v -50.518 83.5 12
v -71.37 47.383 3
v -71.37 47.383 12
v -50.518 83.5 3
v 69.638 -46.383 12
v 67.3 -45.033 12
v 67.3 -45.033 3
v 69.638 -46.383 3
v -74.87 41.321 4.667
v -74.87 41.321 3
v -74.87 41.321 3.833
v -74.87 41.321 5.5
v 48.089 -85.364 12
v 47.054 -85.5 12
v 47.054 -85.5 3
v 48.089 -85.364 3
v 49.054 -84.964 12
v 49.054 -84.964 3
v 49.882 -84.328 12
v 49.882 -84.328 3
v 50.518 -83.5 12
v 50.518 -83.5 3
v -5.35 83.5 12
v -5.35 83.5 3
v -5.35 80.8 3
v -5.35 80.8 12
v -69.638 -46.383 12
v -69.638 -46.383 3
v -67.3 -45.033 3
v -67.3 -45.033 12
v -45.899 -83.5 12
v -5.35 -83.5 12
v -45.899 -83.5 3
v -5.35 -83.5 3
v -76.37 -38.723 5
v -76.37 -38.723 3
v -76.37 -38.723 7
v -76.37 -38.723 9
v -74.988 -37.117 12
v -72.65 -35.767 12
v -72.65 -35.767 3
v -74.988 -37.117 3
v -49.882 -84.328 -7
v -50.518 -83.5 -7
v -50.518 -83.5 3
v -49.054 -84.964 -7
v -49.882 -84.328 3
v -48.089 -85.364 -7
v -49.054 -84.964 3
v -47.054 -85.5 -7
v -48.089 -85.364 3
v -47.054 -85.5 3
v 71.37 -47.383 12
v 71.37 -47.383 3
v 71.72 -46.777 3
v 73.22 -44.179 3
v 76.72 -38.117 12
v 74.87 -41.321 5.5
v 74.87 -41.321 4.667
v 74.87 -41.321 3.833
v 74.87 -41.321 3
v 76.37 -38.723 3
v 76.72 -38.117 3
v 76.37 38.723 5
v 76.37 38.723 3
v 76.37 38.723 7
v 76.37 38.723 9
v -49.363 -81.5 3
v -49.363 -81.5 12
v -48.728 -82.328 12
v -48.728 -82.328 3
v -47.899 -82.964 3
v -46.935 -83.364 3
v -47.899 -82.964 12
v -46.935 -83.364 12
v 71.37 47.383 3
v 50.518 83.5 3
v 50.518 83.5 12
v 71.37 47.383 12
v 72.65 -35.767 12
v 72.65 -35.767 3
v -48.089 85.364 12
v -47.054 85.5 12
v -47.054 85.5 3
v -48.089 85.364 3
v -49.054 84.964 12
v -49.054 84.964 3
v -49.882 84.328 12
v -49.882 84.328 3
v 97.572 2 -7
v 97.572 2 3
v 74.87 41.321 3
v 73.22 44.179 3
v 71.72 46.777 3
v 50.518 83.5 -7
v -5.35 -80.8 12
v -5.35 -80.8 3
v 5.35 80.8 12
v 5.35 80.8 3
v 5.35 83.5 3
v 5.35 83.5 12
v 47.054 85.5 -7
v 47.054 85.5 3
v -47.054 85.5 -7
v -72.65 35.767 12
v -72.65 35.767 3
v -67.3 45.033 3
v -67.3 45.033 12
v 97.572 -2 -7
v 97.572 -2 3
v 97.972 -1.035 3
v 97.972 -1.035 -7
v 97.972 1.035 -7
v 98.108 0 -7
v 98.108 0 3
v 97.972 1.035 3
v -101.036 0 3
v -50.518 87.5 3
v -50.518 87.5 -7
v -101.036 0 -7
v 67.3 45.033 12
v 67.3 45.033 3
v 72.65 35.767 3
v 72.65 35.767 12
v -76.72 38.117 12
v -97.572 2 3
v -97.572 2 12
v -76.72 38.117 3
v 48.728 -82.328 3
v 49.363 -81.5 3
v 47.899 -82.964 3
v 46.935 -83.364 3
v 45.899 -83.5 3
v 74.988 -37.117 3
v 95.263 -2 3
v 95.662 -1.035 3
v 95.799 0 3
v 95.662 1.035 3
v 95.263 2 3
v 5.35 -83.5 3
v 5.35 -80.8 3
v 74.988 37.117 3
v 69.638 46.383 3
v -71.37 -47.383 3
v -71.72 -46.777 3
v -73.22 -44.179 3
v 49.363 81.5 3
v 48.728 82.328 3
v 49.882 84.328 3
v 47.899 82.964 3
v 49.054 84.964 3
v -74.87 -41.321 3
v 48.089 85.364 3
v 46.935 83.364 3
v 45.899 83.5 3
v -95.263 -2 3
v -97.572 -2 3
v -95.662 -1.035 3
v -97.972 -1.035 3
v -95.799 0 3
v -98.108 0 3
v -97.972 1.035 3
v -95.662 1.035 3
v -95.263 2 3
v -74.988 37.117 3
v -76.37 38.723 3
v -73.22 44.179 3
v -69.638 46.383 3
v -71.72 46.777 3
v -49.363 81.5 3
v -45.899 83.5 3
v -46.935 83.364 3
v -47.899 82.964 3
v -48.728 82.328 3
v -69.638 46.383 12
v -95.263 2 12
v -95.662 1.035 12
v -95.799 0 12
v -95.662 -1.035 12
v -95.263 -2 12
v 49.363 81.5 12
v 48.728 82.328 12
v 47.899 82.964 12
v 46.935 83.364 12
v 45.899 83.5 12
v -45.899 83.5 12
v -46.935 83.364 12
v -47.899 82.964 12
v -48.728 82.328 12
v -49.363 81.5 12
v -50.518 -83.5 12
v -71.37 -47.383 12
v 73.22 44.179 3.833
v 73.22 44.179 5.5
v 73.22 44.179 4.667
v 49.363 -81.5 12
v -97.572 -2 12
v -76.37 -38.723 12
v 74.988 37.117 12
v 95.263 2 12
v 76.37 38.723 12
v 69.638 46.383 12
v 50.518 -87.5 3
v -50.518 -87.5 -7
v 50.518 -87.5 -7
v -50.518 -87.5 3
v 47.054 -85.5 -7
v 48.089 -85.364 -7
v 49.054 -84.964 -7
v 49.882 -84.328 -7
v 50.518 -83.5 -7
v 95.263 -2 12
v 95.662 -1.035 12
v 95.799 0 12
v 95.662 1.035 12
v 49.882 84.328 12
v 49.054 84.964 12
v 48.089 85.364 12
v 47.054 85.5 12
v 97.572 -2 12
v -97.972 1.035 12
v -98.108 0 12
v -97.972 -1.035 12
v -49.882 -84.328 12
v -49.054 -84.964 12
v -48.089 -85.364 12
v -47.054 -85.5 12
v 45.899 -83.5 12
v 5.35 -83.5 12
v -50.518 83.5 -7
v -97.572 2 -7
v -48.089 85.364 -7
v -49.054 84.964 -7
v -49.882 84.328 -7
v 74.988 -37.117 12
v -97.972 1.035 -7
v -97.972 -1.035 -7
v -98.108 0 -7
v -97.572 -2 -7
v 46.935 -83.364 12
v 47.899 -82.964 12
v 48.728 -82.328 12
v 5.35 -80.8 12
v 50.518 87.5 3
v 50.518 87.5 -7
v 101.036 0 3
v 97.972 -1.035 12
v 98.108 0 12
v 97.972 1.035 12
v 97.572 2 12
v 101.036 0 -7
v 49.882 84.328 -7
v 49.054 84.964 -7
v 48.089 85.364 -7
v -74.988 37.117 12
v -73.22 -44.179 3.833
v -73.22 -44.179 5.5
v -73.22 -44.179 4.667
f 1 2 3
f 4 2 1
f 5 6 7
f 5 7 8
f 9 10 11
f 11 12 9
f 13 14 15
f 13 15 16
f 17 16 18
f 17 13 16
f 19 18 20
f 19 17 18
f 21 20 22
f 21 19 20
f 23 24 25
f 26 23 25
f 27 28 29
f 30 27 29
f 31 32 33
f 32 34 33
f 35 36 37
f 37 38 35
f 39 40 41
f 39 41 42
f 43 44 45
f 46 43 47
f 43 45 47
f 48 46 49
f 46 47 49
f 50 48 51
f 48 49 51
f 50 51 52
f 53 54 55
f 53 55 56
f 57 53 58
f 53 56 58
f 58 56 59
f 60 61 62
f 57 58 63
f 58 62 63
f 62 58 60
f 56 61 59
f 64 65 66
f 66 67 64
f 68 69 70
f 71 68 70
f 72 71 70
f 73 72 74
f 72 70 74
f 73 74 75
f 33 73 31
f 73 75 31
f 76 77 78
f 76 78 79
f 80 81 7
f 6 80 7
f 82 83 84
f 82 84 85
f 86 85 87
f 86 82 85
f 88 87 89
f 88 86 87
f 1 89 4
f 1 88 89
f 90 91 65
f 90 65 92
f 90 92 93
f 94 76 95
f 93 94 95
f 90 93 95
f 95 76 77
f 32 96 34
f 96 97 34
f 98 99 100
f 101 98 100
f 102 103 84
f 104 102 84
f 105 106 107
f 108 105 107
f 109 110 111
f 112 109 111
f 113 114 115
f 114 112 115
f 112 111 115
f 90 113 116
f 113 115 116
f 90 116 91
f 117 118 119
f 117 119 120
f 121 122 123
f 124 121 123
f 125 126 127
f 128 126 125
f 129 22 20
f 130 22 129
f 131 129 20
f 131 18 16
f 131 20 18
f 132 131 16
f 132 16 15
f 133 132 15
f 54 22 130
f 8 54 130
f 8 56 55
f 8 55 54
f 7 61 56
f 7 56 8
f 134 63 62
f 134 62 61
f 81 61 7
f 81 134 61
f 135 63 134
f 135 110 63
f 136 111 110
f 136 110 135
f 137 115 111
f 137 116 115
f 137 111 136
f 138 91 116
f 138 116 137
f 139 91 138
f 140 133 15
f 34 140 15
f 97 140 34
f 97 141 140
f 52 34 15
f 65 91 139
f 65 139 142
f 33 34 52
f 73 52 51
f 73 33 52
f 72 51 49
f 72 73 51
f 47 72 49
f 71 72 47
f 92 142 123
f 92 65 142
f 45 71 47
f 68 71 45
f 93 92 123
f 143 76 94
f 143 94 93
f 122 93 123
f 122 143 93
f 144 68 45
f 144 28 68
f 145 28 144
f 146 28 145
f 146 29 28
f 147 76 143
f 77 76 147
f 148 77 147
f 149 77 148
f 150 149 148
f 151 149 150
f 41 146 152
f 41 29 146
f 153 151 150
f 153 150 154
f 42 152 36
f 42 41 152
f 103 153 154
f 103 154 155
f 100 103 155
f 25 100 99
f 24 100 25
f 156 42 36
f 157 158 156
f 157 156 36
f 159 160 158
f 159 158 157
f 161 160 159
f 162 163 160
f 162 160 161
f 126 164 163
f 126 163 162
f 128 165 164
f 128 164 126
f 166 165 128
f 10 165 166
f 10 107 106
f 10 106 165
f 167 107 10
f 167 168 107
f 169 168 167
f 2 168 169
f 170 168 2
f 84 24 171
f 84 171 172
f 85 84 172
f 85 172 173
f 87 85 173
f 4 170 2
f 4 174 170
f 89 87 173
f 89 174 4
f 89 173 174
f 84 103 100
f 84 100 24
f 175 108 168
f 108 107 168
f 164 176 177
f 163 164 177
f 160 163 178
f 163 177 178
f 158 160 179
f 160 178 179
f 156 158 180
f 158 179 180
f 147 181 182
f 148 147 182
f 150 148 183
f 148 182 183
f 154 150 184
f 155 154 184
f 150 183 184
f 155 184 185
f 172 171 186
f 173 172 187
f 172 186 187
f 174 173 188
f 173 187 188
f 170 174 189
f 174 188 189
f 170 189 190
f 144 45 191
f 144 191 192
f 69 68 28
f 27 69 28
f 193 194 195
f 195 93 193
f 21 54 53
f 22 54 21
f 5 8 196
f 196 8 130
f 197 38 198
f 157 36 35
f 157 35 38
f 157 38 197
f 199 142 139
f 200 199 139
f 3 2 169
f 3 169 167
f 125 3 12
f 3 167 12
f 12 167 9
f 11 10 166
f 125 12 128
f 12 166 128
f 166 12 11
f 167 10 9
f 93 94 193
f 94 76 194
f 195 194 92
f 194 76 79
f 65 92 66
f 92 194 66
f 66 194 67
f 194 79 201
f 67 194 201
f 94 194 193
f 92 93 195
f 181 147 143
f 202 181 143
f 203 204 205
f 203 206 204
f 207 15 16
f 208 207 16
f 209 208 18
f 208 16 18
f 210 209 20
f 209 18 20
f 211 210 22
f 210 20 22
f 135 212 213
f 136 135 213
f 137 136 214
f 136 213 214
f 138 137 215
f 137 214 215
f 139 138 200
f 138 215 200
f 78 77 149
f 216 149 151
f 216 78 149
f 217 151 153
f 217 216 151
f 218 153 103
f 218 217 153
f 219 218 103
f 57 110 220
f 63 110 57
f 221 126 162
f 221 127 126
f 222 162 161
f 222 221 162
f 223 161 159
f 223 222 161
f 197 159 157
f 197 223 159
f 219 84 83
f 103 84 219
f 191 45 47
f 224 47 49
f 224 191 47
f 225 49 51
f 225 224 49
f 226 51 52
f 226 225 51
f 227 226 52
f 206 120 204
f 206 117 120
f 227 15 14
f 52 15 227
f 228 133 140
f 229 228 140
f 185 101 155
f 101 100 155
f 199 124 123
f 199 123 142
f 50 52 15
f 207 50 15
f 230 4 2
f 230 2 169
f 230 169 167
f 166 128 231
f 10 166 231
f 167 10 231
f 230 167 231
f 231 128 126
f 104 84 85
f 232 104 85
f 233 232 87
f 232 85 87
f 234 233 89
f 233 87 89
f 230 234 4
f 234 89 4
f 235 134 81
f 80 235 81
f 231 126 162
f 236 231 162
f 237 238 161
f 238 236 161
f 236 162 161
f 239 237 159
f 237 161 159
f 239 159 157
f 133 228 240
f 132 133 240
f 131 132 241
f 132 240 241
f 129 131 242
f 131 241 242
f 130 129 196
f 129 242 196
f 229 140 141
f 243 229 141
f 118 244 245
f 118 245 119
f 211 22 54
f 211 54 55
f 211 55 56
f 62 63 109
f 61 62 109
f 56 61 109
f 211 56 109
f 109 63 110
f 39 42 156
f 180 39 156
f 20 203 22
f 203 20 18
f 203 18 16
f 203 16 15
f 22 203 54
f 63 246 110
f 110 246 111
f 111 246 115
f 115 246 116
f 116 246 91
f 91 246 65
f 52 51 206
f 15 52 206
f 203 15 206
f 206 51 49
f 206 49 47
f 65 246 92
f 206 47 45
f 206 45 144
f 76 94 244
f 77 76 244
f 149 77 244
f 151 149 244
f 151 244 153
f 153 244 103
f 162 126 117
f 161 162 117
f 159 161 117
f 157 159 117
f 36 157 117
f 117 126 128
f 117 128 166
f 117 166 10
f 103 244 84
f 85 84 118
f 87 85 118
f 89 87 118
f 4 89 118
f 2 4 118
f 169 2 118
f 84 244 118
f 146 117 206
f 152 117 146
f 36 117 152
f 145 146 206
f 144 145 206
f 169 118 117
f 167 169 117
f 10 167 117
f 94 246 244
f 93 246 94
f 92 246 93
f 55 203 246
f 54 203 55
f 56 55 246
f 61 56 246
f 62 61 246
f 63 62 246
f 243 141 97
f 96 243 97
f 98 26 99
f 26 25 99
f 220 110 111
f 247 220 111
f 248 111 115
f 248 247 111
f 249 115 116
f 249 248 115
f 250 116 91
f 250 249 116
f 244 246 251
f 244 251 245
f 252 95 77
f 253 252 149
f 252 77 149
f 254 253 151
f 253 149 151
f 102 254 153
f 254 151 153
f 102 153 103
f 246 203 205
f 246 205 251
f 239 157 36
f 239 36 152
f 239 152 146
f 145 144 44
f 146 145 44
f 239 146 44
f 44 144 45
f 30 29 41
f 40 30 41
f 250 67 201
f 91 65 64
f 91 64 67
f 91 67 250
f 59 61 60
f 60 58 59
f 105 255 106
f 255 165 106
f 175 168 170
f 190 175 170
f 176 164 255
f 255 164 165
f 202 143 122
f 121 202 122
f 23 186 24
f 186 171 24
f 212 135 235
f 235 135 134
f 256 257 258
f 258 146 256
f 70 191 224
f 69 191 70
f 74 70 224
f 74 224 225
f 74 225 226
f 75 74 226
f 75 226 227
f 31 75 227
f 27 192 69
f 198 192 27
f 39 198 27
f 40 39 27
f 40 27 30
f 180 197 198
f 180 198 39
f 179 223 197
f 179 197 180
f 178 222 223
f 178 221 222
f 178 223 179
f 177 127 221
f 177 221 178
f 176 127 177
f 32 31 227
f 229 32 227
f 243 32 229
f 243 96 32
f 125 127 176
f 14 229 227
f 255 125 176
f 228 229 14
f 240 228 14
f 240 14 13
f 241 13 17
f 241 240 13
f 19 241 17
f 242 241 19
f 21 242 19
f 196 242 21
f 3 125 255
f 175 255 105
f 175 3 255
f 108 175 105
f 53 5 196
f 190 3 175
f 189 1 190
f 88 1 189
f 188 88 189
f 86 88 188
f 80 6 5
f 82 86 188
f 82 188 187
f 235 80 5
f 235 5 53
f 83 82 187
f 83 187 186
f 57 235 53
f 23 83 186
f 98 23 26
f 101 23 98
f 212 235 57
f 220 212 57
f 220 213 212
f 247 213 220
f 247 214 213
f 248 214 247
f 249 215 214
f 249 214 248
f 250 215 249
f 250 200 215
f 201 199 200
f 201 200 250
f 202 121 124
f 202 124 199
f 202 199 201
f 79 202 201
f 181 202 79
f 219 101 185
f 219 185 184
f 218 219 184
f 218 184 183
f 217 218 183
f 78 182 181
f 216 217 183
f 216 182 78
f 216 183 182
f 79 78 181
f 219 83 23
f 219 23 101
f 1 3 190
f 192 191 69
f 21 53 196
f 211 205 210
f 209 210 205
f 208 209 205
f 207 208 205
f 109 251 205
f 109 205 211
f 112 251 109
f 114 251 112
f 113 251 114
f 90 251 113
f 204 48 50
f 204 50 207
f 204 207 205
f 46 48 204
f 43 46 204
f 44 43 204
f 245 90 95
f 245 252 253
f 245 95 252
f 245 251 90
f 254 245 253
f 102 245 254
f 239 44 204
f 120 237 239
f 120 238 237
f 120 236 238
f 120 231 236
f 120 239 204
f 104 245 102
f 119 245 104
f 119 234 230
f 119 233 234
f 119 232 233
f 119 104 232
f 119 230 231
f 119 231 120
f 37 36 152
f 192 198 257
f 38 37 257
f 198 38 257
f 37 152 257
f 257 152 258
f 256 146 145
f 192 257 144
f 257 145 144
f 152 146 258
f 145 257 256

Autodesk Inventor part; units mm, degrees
ref_plane "YZ Plane" through (0, 0, 0) normal (1, 0, 0) x (0, 1, 0)
ref_plane "XZ Plane" through (0, 0, 0) normal (0, 1, 0) x (-1, 0, 0)
ref_plane "XY Plane" through (0, 0, 0) normal (0, 0, 1) x (1, 0, 0)
sketch "Sketch1" plane through (0, 0, 0) normal (0, 0, 1) x (1, 0, 0)
  line L0 (50.5181, -87.5) -> (-50.5181, -87.5)
  line L1 (-50.5181, -87.5) -> (-101.0363, 0)
  line L2 (-101.0363, 0) -> (-50.5181, 87.5)
  line L3 (-50.5181, 87.5) -> (50.5181, 87.5)
  line L4 (50.5181, 87.5) -> (101.0363, 0)
  line L5 (101.0363, 0) -> (50.5181, -87.5)
  point P0 (0, 0)
  point P1 (0, 0)
  dimension "d0" = 175
extrude "Extrusion1" add sketch "Sketch1" along normal blind 2
sketch "Sketch5" plane through (0, 0, 2) normal (0, 0, 1) x (1, 0, 0)
  line L0 (-50.5181, -87.5) -> (50.5181, -87.5) projected
  line L1 (50.5181, -87.5) -> (101.0363, 0) projected
  line L2 (101.0363, 0) -> (50.5181, 87.5) projected
  line L3 (50.5181, 87.5) -> (-50.5181, 87.5) projected
  line L4 (-50.5181, 87.5) -> (-101.0363, 0) projected
  line L5 (-101.0363, 0) -> (-50.5181, -87.5) projected
  line L6 (-98.7269, 0) -> (-49.3634, 85.5)
  line L7 (-49.3634, 85.5) -> (49.3634, 85.5)
  line L8 (49.3634, 85.5) -> (98.7269, 0)
  line L9 (98.7269, 0) -> (49.3634, -85.5)
  line L10 (49.3634, -85.5) -> (-49.3634, -85.5)
  line L11 (-49.3634, -85.5) -> (-98.7269, 0)
  line L12 (-96.4175, 0) -> (-48.2087, 83.5)
  line L13 (-48.2087, 83.5) -> (48.2087, 83.5)
  line L14 (48.2087, 83.5) -> (96.4175, 0)
  line L15 (96.4175, 0) -> (48.2087, -83.5)
  line L16 (48.2087, -83.5) -> (-48.2087, -83.5)
  line L17 (-48.2087, -83.5) -> (-96.4175, 0)
  point P0 (0, 0)
  dimension "d15" = 2
  dimension "d16" = 2
extrude "Extrusion5" add sketch "Sketch5" along normal blind 10 contours L6 L7 L8 L9 L10 L11
sketch "Sketch7" plane through (0, 0, 2) normal (0, 0, 1) x (1, 0, 0)
  line L0 (48.2087, 83.5) -> (-48.2087, 83.5) projected
  line L1 (-48.2087, 83.5) -> (-96.4175, 0) projected
  line L2 (-96.4175, 0) -> (-48.2087, -83.5) projected
  line L3 (-48.2087, -83.5) -> (48.2087, -83.5) projected
  line L4 (48.2087, -83.5) -> (96.4175, 0) projected
  line L5 (96.4175, 0) -> (48.2087, 83.5) projected
  line L6 (-45.8993, -79.5) -> (-91.7987, 0)
  line L7 (-91.7987, 0) -> (-45.8993, 79.5)
  line L8 (-45.8993, 79.5) -> (45.8993, 79.5)
  line L9 (45.8993, 79.5) -> (91.7987, 0)
  line L10 (91.7987, 0) -> (45.8993, -79.5)
  line L11 (45.8993, -79.5) -> (-45.8993, -79.5)
  point P0 (0, 0)
  dimension "d19" = 4
extrude "Extrusion6" cut sketch "Sketch7" against normal blind 7 contours L6 L7 L8 L9 L10 L11
fillet "Fillet1" radius 10 6 edges at (50.5181, 87.5, 1) (101.0363, 0, 1) (50.5181, -87.5, 1) (-50.5181, -87.5, 1) (-101.0363, 0, 1) (-50.5181, 87.5, 1)
fillet "Fillet1" radius 4 12 edges at (49.3634, -85.5, 7) (-48.2087, -83.5, 7) (-98.7269, 0, 7) (-49.3634, 85.5, 7) (49.3634, 85.5, 7) (98.7269, 0, 7) (48.2087, -83.5, 7) (96.4175, 0, 7) (-48.2087, 83.5, 7) (48.2087, 83.5, 7) (-49.3634, -85.5, 7) (-96.4175, 0, 7)
fillet "Fillet2" radius 10 6 edges at (45.8993, -79.5, 1) (91.7987, 0, 1) (45.8993, 79.5, 1) (-45.8993, 79.5, 1) (-91.7987, 0, 1) (-45.8993, -79.5, 1)
sketch "Sketch8" plane through (0, 0, 12) normal (0, 0, 1) x (1, 0, 0)
  line L0 (-1.65, 83.5) -> (1.65, 83.5)
  line L1 (1.65, 83.5) -> (1.65, 85.5)
  line L2 (1.65, 85.5) -> (-1.65, 85.5)
  line L3 (-1.65, 85.5) -> (-1.65, 83.5)
  line L4 (47.054, 85.5) -> (-47.054, 85.5) projected
  line L5 (-45.8993, 83.5) -> (45.8993, 83.5) projected
  point P0 (0, 0)
  point P1 (0, 85.5)
  point P2 (0, 85.5)
  point P3 (0, 0)
  dimension "d25" = 3.3
extrude "Extrusion7" cut sketch "Sketch8" against normal blind 6.5
sketch "Sketch9" plane through (0, 0, 12) normal (0, 0, 1) x (1, 0, 0)
  line L0 (-4.65, 81.5) -> (-1.65, 81.5)
  line L1 (-1.65, 81.5) -> (-1.65, 85.5)
  line L2 (-1.65, 85.5) -> (-4.65, 85.5)
  line L3 (-4.65, 85.5) -> (-4.65, 81.5)
  line L4 (1.65, 83.5) -> (-1.65, 83.5) projected
  line L5 (1.65, 85.5) -> (1.65, 83.5) projected
  line L6 (-1.65, 85.5) -> (1.65, 85.5) projected
  line L7 (-1.65, 83.5) -> (-1.65, 85.5) projected
  line L8 (0, 83.5) -> (0, 81.6202) construction
  line L9 (-45.8993, 83.5) -> (-1.65, 83.5) projected
  line L10 (-1.65, 83.5) -> (-1.65, 85.5) projected
  line L11 (4.65, 81.5) -> (1.65, 81.5)
  line L12 (1.65, 81.5) -> (1.65, 85.5)
  line L13 (1.65, 85.5) -> (4.65, 85.5)
  line L14 (4.65, 85.5) -> (4.65, 81.5)
  line L15 (-1.65, 85.5) -> (-47.054, 85.5) projected
  point P0 (0, 0)
  dimension "d28" = 4
  dimension "d29" = 3
extrude "Extrusion8" add sketch "Sketch9" against normal up to surface (10 mm away) contours L3 L9 L1 L0 | L3 L2 L1 L9 | L5 L13 L14 L11 L12
pattern_circular "Circular Pattern1" count 6 over 360 about axis through (0, 0, 0) along (0, 0, 1) of "Extrusion8", "Extrusion7"
sketch "Sketch11" plane through (0, 0, 0) normal (0, 0, -1) x (-1, 0, 0)
  arc A0 (53.4049, 82.5) -> (44.7446, 87.5) centre (44.7446, 77.5) ccw projected
  line L0 (44.7446, 87.5) -> (-44.7446, 87.5) projected
  arc A1 (-44.7446, 87.5) -> (-53.4049, 82.5) centre (-44.7446, 77.5) ccw projected
  line L1 (-53.4049, 82.5) -> (-98.1495, 5) projected
  arc A2 (-98.1495, 5) -> (-98.1495, -5) centre (-89.4893, 0) ccw projected
  line L2 (-98.1495, -5) -> (-53.4049, -82.5) projected
  arc A3 (-53.4049, -82.5) -> (-44.7446, -87.5) centre (-44.7446, -77.5) ccw projected
  line L3 (-44.7446, -87.5) -> (44.7446, -87.5) projected
  arc A4 (44.7446, -87.5) -> (53.4049, -82.5) centre (44.7446, -77.5) ccw projected
  line L4 (53.4049, -82.5) -> (98.1495, -5) projected
  arc A5 (98.1495, -5) -> (98.1495, 5) centre (89.4893, 0) ccw projected
  line L5 (98.1495, 5) -> (53.4049, 82.5) projected
  line L6 (40.1258, -79.5) -> (-40.1258, -79.5) projected
  arc A6 (-48.7861, -74.5) -> (-40.1258, -79.5) centre (-40.1258, -69.5) ccw projected
  line L7 (-48.7861, -74.5) -> (-88.9119, -5) projected
  arc A7 (-88.9119, 5) -> (-88.9119, -5) centre (-80.2517, 0) ccw projected
  line L8 (-88.9119, 5) -> (-48.7861, 74.5) projected
  arc A8 (-40.1258, 79.5) -> (-48.7861, 74.5) centre (-40.1258, 69.5) ccw projected
  line L9 (-40.1258, 79.5) -> (40.1258, 79.5) projected
  arc A9 (48.7861, 74.5) -> (40.1258, 79.5) centre (40.1258, 69.5) ccw projected
  line L10 (48.7861, 74.5) -> (88.9119, 5) projected
  arc A10 (88.9119, -5) -> (88.9119, 5) centre (80.2517, 0) ccw projected
  line L11 (88.9119, -5) -> (48.7861, -74.5) projected
  arc A11 (40.1258, -79.5) -> (48.7861, -74.5) centre (40.1258, -69.5) ccw projected
  point P0 (0, 0)
extrude "Extrusion9" cut sketch "Sketch11" against normal blind 3
sketch "Sketch12" plane through (0, 0, 12) normal (0, 0, 1) x (1, 0, 0)
  line L0 (74.6381, 37.723) -> (95.2628, 2) projected
  arc A0 (95.2628, -2) -> (95.2628, 2) centre (91.7987, 0) ccw projected
  line L1 (95.2628, -2) -> (74.6381, -37.723) projected
  line L2 (74.6381, -37.723) -> (72.9061, -36.723) projected
  line L3 (72.9061, -36.723) -> (71.4061, -39.3211) projected
  line L4 (71.4061, -39.3211) -> (74.8702, -41.3211) projected
  line L5 (74.8702, -41.3211) -> (97.5722, -2) projected
  arc A1 (97.5722, -2) -> (97.5722, 2) centre (94.1081, 0) ccw projected
  line L6 (97.5722, 2) -> (74.8702, 41.3211) projected
  line L7 (71.4061, 39.3211) -> (74.8702, 41.3211) projected
  line L8 (72.9061, 36.723) -> (71.4061, 39.3211) projected
  line L9 (74.6381, 37.723) -> (72.9061, 36.723) projected
  line L10 (73.2202, 44.1789) -> (50.5181, 83.5) projected
  arc A2 (50.5181, 83.5) -> (47.054, 85.5) centre (47.054, 81.5) ccw projected
  line L11 (47.054, 85.5) -> (1.65, 85.5) projected
  line L12 (1.65, 81.5) -> (1.65, 85.5) projected
  line L13 (4.65, 81.5) -> (1.65, 81.5) projected
  line L14 (4.65, 83.5) -> (4.65, 81.5) projected
  line L15 (4.65, 83.5) -> (45.8993, 83.5) projected
  arc A3 (49.3634, 81.5) -> (45.8993, 83.5) centre (45.8993, 79.5) ccw projected
  line L16 (49.3634, 81.5) -> (69.9881, 45.777) projected
  line L17 (69.9881, 45.777) -> (68.2561, 44.777) projected
  line L18 (68.2561, 44.777) -> (69.7561, 42.1789) projected
  line L19 (69.7561, 42.1789) -> (73.2202, 44.1789) projected
  line L20 (-69.9881, 45.777) -> (-49.3634, 81.5) projected
  arc A4 (-45.8993, 83.5) -> (-49.3634, 81.5) centre (-45.8993, 79.5) ccw projected
  line L21 (-45.8993, 83.5) -> (-4.65, 83.5) projected
  line L22 (-4.65, 83.5) -> (-4.65, 81.5) projected
  line L23 (-4.65, 81.5) -> (-1.65, 81.5) projected
  line L24 (-1.65, 81.5) -> (-1.65, 85.5) projected
  line L25 (-1.65, 85.5) -> (-47.054, 85.5) projected
  arc A5 (-47.054, 85.5) -> (-50.5181, 83.5) centre (-47.054, 81.5) ccw projected
  line L26 (-50.5181, 83.5) -> (-73.2202, 44.1789) projected
  line L27 (-69.7561, 42.1789) -> (-73.2202, 44.1789) projected
  line L28 (-68.2561, 44.777) -> (-69.7561, 42.1789) projected
  line L29 (-69.9881, 45.777) -> (-68.2561, 44.777) projected
  line L30 (-74.6381, -37.723) -> (-95.2628, -2) projected
  arc A6 (-95.2628, 2) -> (-95.2628, -2) centre (-91.7987, 0) ccw projected
  line L31 (-95.2628, 2) -> (-74.6381, 37.723) projected
  line L32 (-74.6381, 37.723) -> (-72.9061, 36.723) projected
  line L33 (-72.9061, 36.723) -> (-71.4061, 39.3211) projected
  line L34 (-71.4061, 39.3211) -> (-74.8702, 41.3211) projected
  line L35 (-74.8702, 41.3211) -> (-97.5722, 2) projected
  arc A7 (-97.5722, 2) -> (-97.5722, -2) centre (-94.1081, 0) ccw projected
  line L36 (-97.5722, -2) -> (-74.8702, -41.3211) projected
  line L37 (-71.4061, -39.3211) -> (-74.8702, -41.3211) projected
  line L38 (-72.9061, -36.723) -> (-71.4061, -39.3211) projected
  line L39 (-74.6381, -37.723) -> (-72.9061, -36.723) projected
  line L40 (-4.65, -83.5) -> (-45.8993, -83.5) projected
  arc A8 (-49.3634, -81.5) -> (-45.8993, -83.5) centre (-45.8993, -79.5) ccw projected
  line L41 (-49.3634, -81.5) -> (-69.9881, -45.777) projected
  line L42 (-69.9881, -45.777) -> (-68.2561, -44.777) projected
  line L43 (-68.2561, -44.777) -> (-69.7561, -42.1789) projected
  line L44 (-69.7561, -42.1789) -> (-73.2202, -44.1789) projected
  line L45 (-73.2202, -44.1789) -> (-50.5181, -83.5) projected
  arc A9 (-50.5181, -83.5) -> (-47.054, -85.5) centre (-47.054, -81.5) ccw projected
  line L46 (-47.054, -85.5) -> (-1.65, -85.5) projected
  line L47 (-1.65, -81.5) -> (-1.65, -85.5) projected
  line L48 (-4.65, -81.5) -> (-1.65, -81.5) projected
  line L49 (-4.65, -83.5) -> (-4.65, -81.5) projected
  line L50 (69.9881, -45.777) -> (49.3634, -81.5) projected
  arc A10 (45.8993, -83.5) -> (49.3634, -81.5) centre (45.8993, -79.5) ccw projected
  line L51 (45.8993, -83.5) -> (4.65, -83.5) projected
  line L52 (4.65, -83.5) -> (4.65, -81.5) projected
  line L53 (4.65, -81.5) -> (1.65, -81.5) projected
  line L54 (1.65, -81.5) -> (1.65, -85.5) projected
  line L55 (1.65, -85.5) -> (47.054, -85.5) projected
  arc A11 (47.054, -85.5) -> (50.5181, -83.5) centre (47.054, -81.5) ccw projected
  line L56 (50.5181, -83.5) -> (73.2202, -44.1789) projected
  line L57 (69.7561, -42.1789) -> (73.2202, -44.1789) projected
  line L58 (68.2561, -44.777) -> (69.7561, -42.1789) projected
  line L59 (69.9881, -45.777) -> (68.2561, -44.777) projected
  line L60 (74.6381, 37.723) -> (72.9061, 36.723) projected
  line L61 (72.9061, 36.723) -> (76.3702, 38.723)
  line L62 (97.5722, 2) -> (74.8702, 41.3211) projected
  line L63 (76.3702, 38.723) -> (74.8702, 41.3211)
  line L64 (74.8702, 41.3211) -> (71.4061, 39.3211)
  line L65 (71.4061, 39.3211) -> (72.9061, 36.723)
  line L66 (69.7561, 42.1789) -> (73.2202, 44.1789) projected
  line L67 (73.2202, 44.1789) -> (69.7561, 42.1789)
  line L68 (69.7561, 42.1789) -> (68.2561, 44.777)
  line L69 (68.2561, 44.777) -> (71.7202, 46.777)
  line L70 (71.7202, 46.777) -> (73.2202, 44.1789)
  line L71 (97.5722, 2) -> (50.5181, 83.5) projected
  point P0 (0, 0)
extrude "Extrusion10" cut sketch "Sketch12" against normal blind 3 contours L19 L18 L17 L69 L10 | L9 L8 L7 L6 L61
sketch "Sketch13" plane through (73.1381, 40.3211, 5.5) normal (0, 0, 1) x (0.866, 0.5, 0)
  line L0 (0, 0) -> (0, 3.3) projected
  line L1 (2, 0) -> (0, 0) projected
  line L2 (2, 3.3) -> (2, 0) projected
  line L3 (0, 3.3) -> (2, 3.3) projected
  line L4 (2, 6.3) -> (2, 3.3) projected
  line L5 (0, 6.3) -> (2, 6.3) projected
  line L6 (-2, 6.3) -> (0, 6.3) projected
  line L7 (-2, 3.3) -> (-2, 6.3) projected
  line L8 (2, 3.3) -> (-2, 3.3) projected
  line L9 (2, -3) -> (0, -3) projected
  line L10 (2, 0) -> (2, -3) projected
  line L11 (-2, 0) -> (2, 0) projected
  line L12 (-2, -3) -> (-2, 0) projected
  line L13 (0, -3) -> (-2, -3) projected
  line L14 (0, 0) -> (-2, 0) projected
  line L15 (2, 3.3) -> (-2, 3.3)
  line L16 (-2, 3.3) -> (-2, 0)
  line L17 (-2, 0) -> (2, 0)
  line L18 (2, 0) -> (2, 3.3)
  point P0 (-83.5, 1.65)
extrude "Extrusion11" add sketch "Sketch13" along normal blind 3.5 contours L11 L16 L8 L0 | L0 L3 L2 L1
pattern_circular "Circular Pattern2" count 6 over 360 about axis through (0, 0, 0) along (0, 0, 1) of "Extrusion11", "Extrusion10"
sketch "Sketch14" plane through (0, 0, 3) normal (0, 0, -1) x (-1, 0, 0)
  line L0 (1.65, 83.5) -> (-1.65, 83.5) projected
  line L1 (1.65, 81.5) -> (1.65, 83.5) projected
  line L2 (4.65, 81.5) -> (1.65, 81.5) projected
  line L3 (4.65, 83.5) -> (4.65, 81.5) projected
  line L4 (45.8993, 83.5) -> (4.65, 83.5) projected
  arc A0 (49.3634, 81.5) -> (45.8993, 83.5) centre (45.8993, 79.5) ccw projected
  line L5 (69.9881, 45.777) -> (49.3634, 81.5) projected
  line L6 (68.2561, 44.777) -> (69.9881, 45.777) projected
  line L7 (69.7561, 42.1789) -> (68.2561, 44.777) projected
  line L8 (71.4881, 43.1789) -> (69.7561, 42.1789) projected
  line L9 (73.1381, 40.3211) -> (71.4881, 43.1789) projected
  line L10 (71.4061, 39.3211) -> (73.1381, 40.3211) projected
  line L11 (72.9061, 36.723) -> (71.4061, 39.3211) projected
  line L12 (74.6381, 37.723) -> (72.9061, 36.723) projected
  line L13 (95.2628, 2) -> (74.6381, 37.723) projected
  arc A1 (95.2628, -2) -> (95.2628, 2) centre (91.7987, 0) ccw projected
  line L14 (74.6381, -37.723) -> (95.2628, -2) projected
  line L15 (72.9061, -36.723) -> (74.6381, -37.723) projected
  line L16 (71.4061, -39.3211) -> (72.9061, -36.723) projected
  line L17 (73.1381, -40.3211) -> (71.4061, -39.3211) projected
  line L18 (71.4881, -43.1789) -> (73.1381, -40.3211) projected
  line L19 (69.7561, -42.1789) -> (71.4881, -43.1789) projected
  line L20 (68.2561, -44.777) -> (69.7561, -42.1789) projected
  line L21 (69.9881, -45.777) -> (68.2561, -44.777) projected
  line L22 (49.3634, -81.5) -> (69.9881, -45.777) projected
  arc A2 (45.8993, -83.5) -> (49.3634, -81.5) centre (45.8993, -79.5) ccw projected
  line L23 (4.65, -83.5) -> (45.8993, -83.5) projected
  line L24 (4.65, -81.5) -> (4.65, -83.5) projected
  line L25 (1.65, -81.5) -> (4.65, -81.5) projected
  line L26 (1.65, -83.5) -> (1.65, -81.5) projected
  line L27 (-1.65, -83.5) -> (1.65, -83.5) projected
  line L28 (-1.65, -81.5) -> (-1.65, -83.5) projected
  line L29 (-4.65, -81.5) -> (-1.65, -81.5) projected
  line L30 (-4.65, -83.5) -> (-4.65, -81.5) projected
  line L31 (-45.8993, -83.5) -> (-4.65, -83.5) projected
  arc A3 (-49.3634, -81.5) -> (-45.8993, -83.5) centre (-45.8993, -79.5) ccw projected
  line L32 (-69.9881, -45.777) -> (-49.3634, -81.5) projected
  line L33 (-68.2561, -44.777) -> (-69.9881, -45.777) projected
  line L34 (-69.7561, -42.1789) -> (-68.2561, -44.777) projected
  line L35 (-71.4881, -43.1789) -> (-69.7561, -42.1789) projected
  line L36 (-73.1381, -40.3211) -> (-71.4881, -43.1789) projected
  line L37 (-71.4061, -39.3211) -> (-73.1381, -40.3211) projected
  line L38 (-72.9061, -36.723) -> (-71.4061, -39.3211) projected
  line L39 (-74.6381, -37.723) -> (-72.9061, -36.723) projected
  line L40 (-95.2628, -2) -> (-74.6381, -37.723) projected
  arc A4 (-95.2628, 2) -> (-95.2628, -2) centre (-91.7987, 0) ccw projected
  line L41 (-74.6381, 37.723) -> (-95.2628, 2) projected
  line L42 (-72.9061, 36.723) -> (-74.6381, 37.723) projected
  line L43 (-71.4061, 39.3211) -> (-72.9061, 36.723) projected
  line L44 (-73.1381, 40.3211) -> (-71.4061, 39.3211) projected
  line L45 (-71.4881, 43.1789) -> (-73.1381, 40.3211) projected
  line L46 (-69.7561, 42.1789) -> (-71.4881, 43.1789) projected
  line L47 (-68.2561, 44.777) -> (-69.7561, 42.1789) projected
  line L48 (-69.9881, 45.777) -> (-68.2561, 44.777) projected
  line L49 (-49.3634, 81.5) -> (-69.9881, 45.777) projected
  arc A5 (-45.8993, 83.5) -> (-49.3634, 81.5) centre (-45.8993, 79.5) ccw projected
  line L50 (-4.65, 83.5) -> (-45.8993, 83.5) projected
  line L51 (-4.65, 81.5) -> (-4.65, 83.5) projected
  line L52 (-1.65, 81.5) -> (-4.65, 81.5) projected
  line L53 (-1.65, 83.5) -> (-1.65, 81.5) projected
  line L54 (-47.054, 85.5) -> (47.054, 85.5) projected
  arc A6 (-47.054, 85.5) -> (-50.5181, 83.5) centre (-47.054, 81.5) ccw projected
  line L55 (-97.5722, 2) -> (-50.5181, 83.5) projected
  arc A7 (-97.5722, 2) -> (-97.5722, -2) centre (-94.1081, 0) ccw projected
  line L56 (-50.5181, -83.5) -> (-97.5722, -2) projected
  arc A8 (-50.5181, -83.5) -> (-47.054, -85.5) centre (-47.054, -81.5) ccw projected
  line L57 (47.054, -85.5) -> (-47.054, -85.5) projected
  arc A9 (47.054, -85.5) -> (50.5181, -83.5) centre (47.054, -81.5) ccw projected
  line L58 (97.5722, -2) -> (50.5181, -83.5) projected
  arc A10 (97.5722, -2) -> (97.5722, 2) centre (94.1081, 0) ccw projected
  line L59 (50.5181, 83.5) -> (97.5722, 2) projected
  arc A11 (50.5181, 83.5) -> (47.054, 85.5) centre (47.054, 81.5) ccw projected
  line L60 (5.35, -85.5) -> (-5.35, -85.5)
  line L61 (-5.35, -85.5) -> (-5.35, -80.8)
  line L62 (-5.35, -80.8) -> (5.35, -80.8)
  line L63 (5.35, -80.8) -> (5.35, -85.5)
  point P0 (0, 0)
  dimension "d44" = 0.7
  dimension "d45" = 0.7
  dimension "d46" = 0.7
extrude "Extrusion12" add sketch "Sketch14" against normal up to surface (9 mm away) contours L63 L57 L61 L31 L30 L29 L28 L27 L26 L25 L24 L23 | L23 L24 L25 L26 L27 L28 L29 L30 L31 L61 L62 L63
pattern_circular "Circular Pattern3" count 6 over 360 about axis through (0, 0, 0) along (0, 0, 1) of "Extrusion12"
sketch "Sketch15" plane through (0, 0, 3) normal (0, 0, -1) x (-1, 0, 0)
  line L0 (49.3634, -81.5) -> (69.6381, -46.3832) projected
  arc A0 (45.8993, -83.5) -> (49.3634, -81.5) centre (45.8993, -79.5) ccw projected
  line L1 (5.35, -83.5) -> (45.8993, -83.5) projected
  line L2 (5.35, -80.8) -> (5.35, -83.5) projected
  line L3 (-5.35, -80.8) -> (5.35, -80.8) projected
  line L4 (-5.35, -83.5) -> (-5.35, -80.8) projected
  line L5 (-45.8993, -83.5) -> (-5.35, -83.5) projected
  arc A1 (-49.3634, -81.5) -> (-45.8993, -83.5) centre (-45.8993, -79.5) ccw projected
  line L6 (-69.6381, -46.3832) -> (-49.3634, -81.5) projected
  line L7 (-67.2999, -45.0332) -> (-69.6381, -46.3832) projected
  line L8 (-72.6499, -35.7668) -> (-67.2999, -45.0332) projected
  line L9 (-74.9881, -37.1168) -> (-72.6499, -35.7668) projected
  line L10 (-95.2628, -2) -> (-74.9881, -37.1168) projected
  arc A2 (-95.2628, 2) -> (-95.2628, -2) centre (-91.7987, 0) ccw projected
  line L11 (-74.9881, 37.1168) -> (-95.2628, 2) projected
  line L12 (-72.6499, 35.7668) -> (-74.9881, 37.1168) projected
  line L13 (-67.2999, 45.0332) -> (-72.6499, 35.7668) projected
  line L14 (-69.6381, 46.3832) -> (-67.2999, 45.0332) projected
  line L15 (-49.3634, 81.5) -> (-69.6381, 46.3832) projected
  arc A3 (-45.8993, 83.5) -> (-49.3634, 81.5) centre (-45.8993, 79.5) ccw projected
  line L16 (-5.35, 83.5) -> (-45.8993, 83.5) projected
  line L17 (-5.35, 80.8) -> (-5.35, 83.5) projected
  line L18 (5.35, 80.8) -> (-5.35, 80.8) projected
  line L19 (5.35, 83.5) -> (5.35, 80.8) projected
  line L20 (45.8993, 83.5) -> (5.35, 83.5) projected
  arc A4 (49.3634, 81.5) -> (45.8993, 83.5) centre (45.8993, 79.5) ccw projected
  line L21 (69.6381, 46.3832) -> (49.3634, 81.5) projected
  line L22 (67.2999, 45.0332) -> (69.6381, 46.3832) projected
  line L23 (72.6499, 35.7668) -> (67.2999, 45.0332) projected
  line L24 (74.9881, 37.1168) -> (72.6499, 35.7668) projected
  line L25 (95.2628, 2) -> (74.9881, 37.1168) projected
  arc A5 (95.2628, -2) -> (95.2628, 2) centre (91.7987, 0) ccw projected
  line L26 (74.9881, -37.1168) -> (95.2628, -2) projected
  line L27 (72.6499, -35.7668) -> (74.9881, -37.1168) projected
  line L28 (67.2999, -45.0332) -> (72.6499, -35.7668) projected
  line L29 (69.6381, -46.3832) -> (67.2999, -45.0332) projected
  line L30 (97.5722, -2) -> (50.5181, -83.5) projected
  arc A6 (97.5722, -2) -> (97.5722, 2) centre (94.1081, 0) ccw projected
  line L31 (50.5181, 83.5) -> (97.5722, 2) projected
  arc A7 (50.5181, 83.5) -> (47.054, 85.5) centre (47.054, 81.5) ccw projected
  line L32 (-47.054, 85.5) -> (47.054, 85.5) projected
  arc A8 (-47.054, 85.5) -> (-50.5181, 83.5) centre (-47.054, 81.5) ccw projected
  line L33 (-97.5722, 2) -> (-50.5181, 83.5) projected
  arc A9 (-97.5722, 2) -> (-97.5722, -2) centre (-94.1081, 0) ccw projected
  line L34 (-50.5181, -83.5) -> (-97.5722, -2) projected
  arc A10 (-50.5181, -83.5) -> (-47.054, -85.5) centre (-47.054, -81.5) ccw projected
  line L35 (47.054, -85.5) -> (-47.054, -85.5) projected
  arc A11 (47.054, -85.5) -> (50.5181, -83.5) centre (47.054, -81.5) ccw projected
  line L36 (-50.5181, -87.5) -> (-101.0363, 0)
  line L37 (-101.0363, 0) -> (-50.5181, 87.5)
  line L38 (-50.5181, 87.5) -> (50.5181, 87.5)
  line L39 (50.5181, 87.5) -> (101.0363, 0)
  line L40 (101.0363, 0) -> (50.5181, -87.5)
  line L41 (50.5181, -87.5) -> (-50.5181, -87.5)
  point P0 (0, 0)
  point P1 (0, 0)
  dimension "d52" = 175
extrude "Extrusion13" add sketch "Sketch15" along normal blind 10 contours L36 L37 L38 L39 L40 L41
equation "\"d45\" = d44"
equation "\"d46\" = d44"
properties part number "Cover v1"
